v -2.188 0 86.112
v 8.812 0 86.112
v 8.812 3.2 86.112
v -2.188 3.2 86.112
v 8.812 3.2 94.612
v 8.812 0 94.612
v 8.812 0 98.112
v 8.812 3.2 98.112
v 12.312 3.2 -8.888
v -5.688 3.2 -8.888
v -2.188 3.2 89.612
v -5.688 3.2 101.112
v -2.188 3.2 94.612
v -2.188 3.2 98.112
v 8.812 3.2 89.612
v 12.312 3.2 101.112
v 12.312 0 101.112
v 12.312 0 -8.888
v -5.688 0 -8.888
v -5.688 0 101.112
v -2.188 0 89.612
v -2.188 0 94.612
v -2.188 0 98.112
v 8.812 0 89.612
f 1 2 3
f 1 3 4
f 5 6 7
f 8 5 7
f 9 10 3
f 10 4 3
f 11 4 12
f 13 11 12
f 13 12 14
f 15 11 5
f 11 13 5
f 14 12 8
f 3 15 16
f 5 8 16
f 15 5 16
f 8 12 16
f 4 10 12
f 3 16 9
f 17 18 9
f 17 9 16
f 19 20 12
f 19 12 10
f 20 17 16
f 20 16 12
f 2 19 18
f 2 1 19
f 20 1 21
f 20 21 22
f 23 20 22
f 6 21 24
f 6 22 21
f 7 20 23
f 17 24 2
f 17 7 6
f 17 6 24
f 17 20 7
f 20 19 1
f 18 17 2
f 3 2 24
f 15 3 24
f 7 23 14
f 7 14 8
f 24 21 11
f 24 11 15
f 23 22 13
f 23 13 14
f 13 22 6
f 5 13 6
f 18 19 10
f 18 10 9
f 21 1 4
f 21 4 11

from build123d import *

# Parameters (mm, degrees)
F0_W     = 11
F0_H     = 3.5
F0_W_2   = 3.5
F1_DEPTH = 3.2


with BuildPart() as f1:
    # F0 (on Front) → F1 (new body)
    with BuildSketch(Plane.XZ):
        Polygon((12.312121, 101.111746), (-5.687879, 101.111746), (-5.687879, 89.611746), (-2.187879, 89.611746), (8.812121, 89.611746), (12.312121, 89.611746), align=None)
        with Locations((3.312121, 96.361746)):
            Rectangle(F0_W, F0_H, mode=Mode.SUBTRACT)
        Polygon((-2.187879, 86.111746), (-5.687879, 86.111746), (-5.687879, -8.888254), (12.312121, -8.888254), (12.312121, 86.111746), (8.812121, 86.111746), align=None)
        with Locations((10.562121, 87.861746)):
            Rectangle(F0_W_2, F0_H)
        with Locations((-3.937879, 87.861746)):
            Rectangle(F0_W_2, F0_H)
    extrude(amount=-F1_DEPTH)


solid = f1.part
